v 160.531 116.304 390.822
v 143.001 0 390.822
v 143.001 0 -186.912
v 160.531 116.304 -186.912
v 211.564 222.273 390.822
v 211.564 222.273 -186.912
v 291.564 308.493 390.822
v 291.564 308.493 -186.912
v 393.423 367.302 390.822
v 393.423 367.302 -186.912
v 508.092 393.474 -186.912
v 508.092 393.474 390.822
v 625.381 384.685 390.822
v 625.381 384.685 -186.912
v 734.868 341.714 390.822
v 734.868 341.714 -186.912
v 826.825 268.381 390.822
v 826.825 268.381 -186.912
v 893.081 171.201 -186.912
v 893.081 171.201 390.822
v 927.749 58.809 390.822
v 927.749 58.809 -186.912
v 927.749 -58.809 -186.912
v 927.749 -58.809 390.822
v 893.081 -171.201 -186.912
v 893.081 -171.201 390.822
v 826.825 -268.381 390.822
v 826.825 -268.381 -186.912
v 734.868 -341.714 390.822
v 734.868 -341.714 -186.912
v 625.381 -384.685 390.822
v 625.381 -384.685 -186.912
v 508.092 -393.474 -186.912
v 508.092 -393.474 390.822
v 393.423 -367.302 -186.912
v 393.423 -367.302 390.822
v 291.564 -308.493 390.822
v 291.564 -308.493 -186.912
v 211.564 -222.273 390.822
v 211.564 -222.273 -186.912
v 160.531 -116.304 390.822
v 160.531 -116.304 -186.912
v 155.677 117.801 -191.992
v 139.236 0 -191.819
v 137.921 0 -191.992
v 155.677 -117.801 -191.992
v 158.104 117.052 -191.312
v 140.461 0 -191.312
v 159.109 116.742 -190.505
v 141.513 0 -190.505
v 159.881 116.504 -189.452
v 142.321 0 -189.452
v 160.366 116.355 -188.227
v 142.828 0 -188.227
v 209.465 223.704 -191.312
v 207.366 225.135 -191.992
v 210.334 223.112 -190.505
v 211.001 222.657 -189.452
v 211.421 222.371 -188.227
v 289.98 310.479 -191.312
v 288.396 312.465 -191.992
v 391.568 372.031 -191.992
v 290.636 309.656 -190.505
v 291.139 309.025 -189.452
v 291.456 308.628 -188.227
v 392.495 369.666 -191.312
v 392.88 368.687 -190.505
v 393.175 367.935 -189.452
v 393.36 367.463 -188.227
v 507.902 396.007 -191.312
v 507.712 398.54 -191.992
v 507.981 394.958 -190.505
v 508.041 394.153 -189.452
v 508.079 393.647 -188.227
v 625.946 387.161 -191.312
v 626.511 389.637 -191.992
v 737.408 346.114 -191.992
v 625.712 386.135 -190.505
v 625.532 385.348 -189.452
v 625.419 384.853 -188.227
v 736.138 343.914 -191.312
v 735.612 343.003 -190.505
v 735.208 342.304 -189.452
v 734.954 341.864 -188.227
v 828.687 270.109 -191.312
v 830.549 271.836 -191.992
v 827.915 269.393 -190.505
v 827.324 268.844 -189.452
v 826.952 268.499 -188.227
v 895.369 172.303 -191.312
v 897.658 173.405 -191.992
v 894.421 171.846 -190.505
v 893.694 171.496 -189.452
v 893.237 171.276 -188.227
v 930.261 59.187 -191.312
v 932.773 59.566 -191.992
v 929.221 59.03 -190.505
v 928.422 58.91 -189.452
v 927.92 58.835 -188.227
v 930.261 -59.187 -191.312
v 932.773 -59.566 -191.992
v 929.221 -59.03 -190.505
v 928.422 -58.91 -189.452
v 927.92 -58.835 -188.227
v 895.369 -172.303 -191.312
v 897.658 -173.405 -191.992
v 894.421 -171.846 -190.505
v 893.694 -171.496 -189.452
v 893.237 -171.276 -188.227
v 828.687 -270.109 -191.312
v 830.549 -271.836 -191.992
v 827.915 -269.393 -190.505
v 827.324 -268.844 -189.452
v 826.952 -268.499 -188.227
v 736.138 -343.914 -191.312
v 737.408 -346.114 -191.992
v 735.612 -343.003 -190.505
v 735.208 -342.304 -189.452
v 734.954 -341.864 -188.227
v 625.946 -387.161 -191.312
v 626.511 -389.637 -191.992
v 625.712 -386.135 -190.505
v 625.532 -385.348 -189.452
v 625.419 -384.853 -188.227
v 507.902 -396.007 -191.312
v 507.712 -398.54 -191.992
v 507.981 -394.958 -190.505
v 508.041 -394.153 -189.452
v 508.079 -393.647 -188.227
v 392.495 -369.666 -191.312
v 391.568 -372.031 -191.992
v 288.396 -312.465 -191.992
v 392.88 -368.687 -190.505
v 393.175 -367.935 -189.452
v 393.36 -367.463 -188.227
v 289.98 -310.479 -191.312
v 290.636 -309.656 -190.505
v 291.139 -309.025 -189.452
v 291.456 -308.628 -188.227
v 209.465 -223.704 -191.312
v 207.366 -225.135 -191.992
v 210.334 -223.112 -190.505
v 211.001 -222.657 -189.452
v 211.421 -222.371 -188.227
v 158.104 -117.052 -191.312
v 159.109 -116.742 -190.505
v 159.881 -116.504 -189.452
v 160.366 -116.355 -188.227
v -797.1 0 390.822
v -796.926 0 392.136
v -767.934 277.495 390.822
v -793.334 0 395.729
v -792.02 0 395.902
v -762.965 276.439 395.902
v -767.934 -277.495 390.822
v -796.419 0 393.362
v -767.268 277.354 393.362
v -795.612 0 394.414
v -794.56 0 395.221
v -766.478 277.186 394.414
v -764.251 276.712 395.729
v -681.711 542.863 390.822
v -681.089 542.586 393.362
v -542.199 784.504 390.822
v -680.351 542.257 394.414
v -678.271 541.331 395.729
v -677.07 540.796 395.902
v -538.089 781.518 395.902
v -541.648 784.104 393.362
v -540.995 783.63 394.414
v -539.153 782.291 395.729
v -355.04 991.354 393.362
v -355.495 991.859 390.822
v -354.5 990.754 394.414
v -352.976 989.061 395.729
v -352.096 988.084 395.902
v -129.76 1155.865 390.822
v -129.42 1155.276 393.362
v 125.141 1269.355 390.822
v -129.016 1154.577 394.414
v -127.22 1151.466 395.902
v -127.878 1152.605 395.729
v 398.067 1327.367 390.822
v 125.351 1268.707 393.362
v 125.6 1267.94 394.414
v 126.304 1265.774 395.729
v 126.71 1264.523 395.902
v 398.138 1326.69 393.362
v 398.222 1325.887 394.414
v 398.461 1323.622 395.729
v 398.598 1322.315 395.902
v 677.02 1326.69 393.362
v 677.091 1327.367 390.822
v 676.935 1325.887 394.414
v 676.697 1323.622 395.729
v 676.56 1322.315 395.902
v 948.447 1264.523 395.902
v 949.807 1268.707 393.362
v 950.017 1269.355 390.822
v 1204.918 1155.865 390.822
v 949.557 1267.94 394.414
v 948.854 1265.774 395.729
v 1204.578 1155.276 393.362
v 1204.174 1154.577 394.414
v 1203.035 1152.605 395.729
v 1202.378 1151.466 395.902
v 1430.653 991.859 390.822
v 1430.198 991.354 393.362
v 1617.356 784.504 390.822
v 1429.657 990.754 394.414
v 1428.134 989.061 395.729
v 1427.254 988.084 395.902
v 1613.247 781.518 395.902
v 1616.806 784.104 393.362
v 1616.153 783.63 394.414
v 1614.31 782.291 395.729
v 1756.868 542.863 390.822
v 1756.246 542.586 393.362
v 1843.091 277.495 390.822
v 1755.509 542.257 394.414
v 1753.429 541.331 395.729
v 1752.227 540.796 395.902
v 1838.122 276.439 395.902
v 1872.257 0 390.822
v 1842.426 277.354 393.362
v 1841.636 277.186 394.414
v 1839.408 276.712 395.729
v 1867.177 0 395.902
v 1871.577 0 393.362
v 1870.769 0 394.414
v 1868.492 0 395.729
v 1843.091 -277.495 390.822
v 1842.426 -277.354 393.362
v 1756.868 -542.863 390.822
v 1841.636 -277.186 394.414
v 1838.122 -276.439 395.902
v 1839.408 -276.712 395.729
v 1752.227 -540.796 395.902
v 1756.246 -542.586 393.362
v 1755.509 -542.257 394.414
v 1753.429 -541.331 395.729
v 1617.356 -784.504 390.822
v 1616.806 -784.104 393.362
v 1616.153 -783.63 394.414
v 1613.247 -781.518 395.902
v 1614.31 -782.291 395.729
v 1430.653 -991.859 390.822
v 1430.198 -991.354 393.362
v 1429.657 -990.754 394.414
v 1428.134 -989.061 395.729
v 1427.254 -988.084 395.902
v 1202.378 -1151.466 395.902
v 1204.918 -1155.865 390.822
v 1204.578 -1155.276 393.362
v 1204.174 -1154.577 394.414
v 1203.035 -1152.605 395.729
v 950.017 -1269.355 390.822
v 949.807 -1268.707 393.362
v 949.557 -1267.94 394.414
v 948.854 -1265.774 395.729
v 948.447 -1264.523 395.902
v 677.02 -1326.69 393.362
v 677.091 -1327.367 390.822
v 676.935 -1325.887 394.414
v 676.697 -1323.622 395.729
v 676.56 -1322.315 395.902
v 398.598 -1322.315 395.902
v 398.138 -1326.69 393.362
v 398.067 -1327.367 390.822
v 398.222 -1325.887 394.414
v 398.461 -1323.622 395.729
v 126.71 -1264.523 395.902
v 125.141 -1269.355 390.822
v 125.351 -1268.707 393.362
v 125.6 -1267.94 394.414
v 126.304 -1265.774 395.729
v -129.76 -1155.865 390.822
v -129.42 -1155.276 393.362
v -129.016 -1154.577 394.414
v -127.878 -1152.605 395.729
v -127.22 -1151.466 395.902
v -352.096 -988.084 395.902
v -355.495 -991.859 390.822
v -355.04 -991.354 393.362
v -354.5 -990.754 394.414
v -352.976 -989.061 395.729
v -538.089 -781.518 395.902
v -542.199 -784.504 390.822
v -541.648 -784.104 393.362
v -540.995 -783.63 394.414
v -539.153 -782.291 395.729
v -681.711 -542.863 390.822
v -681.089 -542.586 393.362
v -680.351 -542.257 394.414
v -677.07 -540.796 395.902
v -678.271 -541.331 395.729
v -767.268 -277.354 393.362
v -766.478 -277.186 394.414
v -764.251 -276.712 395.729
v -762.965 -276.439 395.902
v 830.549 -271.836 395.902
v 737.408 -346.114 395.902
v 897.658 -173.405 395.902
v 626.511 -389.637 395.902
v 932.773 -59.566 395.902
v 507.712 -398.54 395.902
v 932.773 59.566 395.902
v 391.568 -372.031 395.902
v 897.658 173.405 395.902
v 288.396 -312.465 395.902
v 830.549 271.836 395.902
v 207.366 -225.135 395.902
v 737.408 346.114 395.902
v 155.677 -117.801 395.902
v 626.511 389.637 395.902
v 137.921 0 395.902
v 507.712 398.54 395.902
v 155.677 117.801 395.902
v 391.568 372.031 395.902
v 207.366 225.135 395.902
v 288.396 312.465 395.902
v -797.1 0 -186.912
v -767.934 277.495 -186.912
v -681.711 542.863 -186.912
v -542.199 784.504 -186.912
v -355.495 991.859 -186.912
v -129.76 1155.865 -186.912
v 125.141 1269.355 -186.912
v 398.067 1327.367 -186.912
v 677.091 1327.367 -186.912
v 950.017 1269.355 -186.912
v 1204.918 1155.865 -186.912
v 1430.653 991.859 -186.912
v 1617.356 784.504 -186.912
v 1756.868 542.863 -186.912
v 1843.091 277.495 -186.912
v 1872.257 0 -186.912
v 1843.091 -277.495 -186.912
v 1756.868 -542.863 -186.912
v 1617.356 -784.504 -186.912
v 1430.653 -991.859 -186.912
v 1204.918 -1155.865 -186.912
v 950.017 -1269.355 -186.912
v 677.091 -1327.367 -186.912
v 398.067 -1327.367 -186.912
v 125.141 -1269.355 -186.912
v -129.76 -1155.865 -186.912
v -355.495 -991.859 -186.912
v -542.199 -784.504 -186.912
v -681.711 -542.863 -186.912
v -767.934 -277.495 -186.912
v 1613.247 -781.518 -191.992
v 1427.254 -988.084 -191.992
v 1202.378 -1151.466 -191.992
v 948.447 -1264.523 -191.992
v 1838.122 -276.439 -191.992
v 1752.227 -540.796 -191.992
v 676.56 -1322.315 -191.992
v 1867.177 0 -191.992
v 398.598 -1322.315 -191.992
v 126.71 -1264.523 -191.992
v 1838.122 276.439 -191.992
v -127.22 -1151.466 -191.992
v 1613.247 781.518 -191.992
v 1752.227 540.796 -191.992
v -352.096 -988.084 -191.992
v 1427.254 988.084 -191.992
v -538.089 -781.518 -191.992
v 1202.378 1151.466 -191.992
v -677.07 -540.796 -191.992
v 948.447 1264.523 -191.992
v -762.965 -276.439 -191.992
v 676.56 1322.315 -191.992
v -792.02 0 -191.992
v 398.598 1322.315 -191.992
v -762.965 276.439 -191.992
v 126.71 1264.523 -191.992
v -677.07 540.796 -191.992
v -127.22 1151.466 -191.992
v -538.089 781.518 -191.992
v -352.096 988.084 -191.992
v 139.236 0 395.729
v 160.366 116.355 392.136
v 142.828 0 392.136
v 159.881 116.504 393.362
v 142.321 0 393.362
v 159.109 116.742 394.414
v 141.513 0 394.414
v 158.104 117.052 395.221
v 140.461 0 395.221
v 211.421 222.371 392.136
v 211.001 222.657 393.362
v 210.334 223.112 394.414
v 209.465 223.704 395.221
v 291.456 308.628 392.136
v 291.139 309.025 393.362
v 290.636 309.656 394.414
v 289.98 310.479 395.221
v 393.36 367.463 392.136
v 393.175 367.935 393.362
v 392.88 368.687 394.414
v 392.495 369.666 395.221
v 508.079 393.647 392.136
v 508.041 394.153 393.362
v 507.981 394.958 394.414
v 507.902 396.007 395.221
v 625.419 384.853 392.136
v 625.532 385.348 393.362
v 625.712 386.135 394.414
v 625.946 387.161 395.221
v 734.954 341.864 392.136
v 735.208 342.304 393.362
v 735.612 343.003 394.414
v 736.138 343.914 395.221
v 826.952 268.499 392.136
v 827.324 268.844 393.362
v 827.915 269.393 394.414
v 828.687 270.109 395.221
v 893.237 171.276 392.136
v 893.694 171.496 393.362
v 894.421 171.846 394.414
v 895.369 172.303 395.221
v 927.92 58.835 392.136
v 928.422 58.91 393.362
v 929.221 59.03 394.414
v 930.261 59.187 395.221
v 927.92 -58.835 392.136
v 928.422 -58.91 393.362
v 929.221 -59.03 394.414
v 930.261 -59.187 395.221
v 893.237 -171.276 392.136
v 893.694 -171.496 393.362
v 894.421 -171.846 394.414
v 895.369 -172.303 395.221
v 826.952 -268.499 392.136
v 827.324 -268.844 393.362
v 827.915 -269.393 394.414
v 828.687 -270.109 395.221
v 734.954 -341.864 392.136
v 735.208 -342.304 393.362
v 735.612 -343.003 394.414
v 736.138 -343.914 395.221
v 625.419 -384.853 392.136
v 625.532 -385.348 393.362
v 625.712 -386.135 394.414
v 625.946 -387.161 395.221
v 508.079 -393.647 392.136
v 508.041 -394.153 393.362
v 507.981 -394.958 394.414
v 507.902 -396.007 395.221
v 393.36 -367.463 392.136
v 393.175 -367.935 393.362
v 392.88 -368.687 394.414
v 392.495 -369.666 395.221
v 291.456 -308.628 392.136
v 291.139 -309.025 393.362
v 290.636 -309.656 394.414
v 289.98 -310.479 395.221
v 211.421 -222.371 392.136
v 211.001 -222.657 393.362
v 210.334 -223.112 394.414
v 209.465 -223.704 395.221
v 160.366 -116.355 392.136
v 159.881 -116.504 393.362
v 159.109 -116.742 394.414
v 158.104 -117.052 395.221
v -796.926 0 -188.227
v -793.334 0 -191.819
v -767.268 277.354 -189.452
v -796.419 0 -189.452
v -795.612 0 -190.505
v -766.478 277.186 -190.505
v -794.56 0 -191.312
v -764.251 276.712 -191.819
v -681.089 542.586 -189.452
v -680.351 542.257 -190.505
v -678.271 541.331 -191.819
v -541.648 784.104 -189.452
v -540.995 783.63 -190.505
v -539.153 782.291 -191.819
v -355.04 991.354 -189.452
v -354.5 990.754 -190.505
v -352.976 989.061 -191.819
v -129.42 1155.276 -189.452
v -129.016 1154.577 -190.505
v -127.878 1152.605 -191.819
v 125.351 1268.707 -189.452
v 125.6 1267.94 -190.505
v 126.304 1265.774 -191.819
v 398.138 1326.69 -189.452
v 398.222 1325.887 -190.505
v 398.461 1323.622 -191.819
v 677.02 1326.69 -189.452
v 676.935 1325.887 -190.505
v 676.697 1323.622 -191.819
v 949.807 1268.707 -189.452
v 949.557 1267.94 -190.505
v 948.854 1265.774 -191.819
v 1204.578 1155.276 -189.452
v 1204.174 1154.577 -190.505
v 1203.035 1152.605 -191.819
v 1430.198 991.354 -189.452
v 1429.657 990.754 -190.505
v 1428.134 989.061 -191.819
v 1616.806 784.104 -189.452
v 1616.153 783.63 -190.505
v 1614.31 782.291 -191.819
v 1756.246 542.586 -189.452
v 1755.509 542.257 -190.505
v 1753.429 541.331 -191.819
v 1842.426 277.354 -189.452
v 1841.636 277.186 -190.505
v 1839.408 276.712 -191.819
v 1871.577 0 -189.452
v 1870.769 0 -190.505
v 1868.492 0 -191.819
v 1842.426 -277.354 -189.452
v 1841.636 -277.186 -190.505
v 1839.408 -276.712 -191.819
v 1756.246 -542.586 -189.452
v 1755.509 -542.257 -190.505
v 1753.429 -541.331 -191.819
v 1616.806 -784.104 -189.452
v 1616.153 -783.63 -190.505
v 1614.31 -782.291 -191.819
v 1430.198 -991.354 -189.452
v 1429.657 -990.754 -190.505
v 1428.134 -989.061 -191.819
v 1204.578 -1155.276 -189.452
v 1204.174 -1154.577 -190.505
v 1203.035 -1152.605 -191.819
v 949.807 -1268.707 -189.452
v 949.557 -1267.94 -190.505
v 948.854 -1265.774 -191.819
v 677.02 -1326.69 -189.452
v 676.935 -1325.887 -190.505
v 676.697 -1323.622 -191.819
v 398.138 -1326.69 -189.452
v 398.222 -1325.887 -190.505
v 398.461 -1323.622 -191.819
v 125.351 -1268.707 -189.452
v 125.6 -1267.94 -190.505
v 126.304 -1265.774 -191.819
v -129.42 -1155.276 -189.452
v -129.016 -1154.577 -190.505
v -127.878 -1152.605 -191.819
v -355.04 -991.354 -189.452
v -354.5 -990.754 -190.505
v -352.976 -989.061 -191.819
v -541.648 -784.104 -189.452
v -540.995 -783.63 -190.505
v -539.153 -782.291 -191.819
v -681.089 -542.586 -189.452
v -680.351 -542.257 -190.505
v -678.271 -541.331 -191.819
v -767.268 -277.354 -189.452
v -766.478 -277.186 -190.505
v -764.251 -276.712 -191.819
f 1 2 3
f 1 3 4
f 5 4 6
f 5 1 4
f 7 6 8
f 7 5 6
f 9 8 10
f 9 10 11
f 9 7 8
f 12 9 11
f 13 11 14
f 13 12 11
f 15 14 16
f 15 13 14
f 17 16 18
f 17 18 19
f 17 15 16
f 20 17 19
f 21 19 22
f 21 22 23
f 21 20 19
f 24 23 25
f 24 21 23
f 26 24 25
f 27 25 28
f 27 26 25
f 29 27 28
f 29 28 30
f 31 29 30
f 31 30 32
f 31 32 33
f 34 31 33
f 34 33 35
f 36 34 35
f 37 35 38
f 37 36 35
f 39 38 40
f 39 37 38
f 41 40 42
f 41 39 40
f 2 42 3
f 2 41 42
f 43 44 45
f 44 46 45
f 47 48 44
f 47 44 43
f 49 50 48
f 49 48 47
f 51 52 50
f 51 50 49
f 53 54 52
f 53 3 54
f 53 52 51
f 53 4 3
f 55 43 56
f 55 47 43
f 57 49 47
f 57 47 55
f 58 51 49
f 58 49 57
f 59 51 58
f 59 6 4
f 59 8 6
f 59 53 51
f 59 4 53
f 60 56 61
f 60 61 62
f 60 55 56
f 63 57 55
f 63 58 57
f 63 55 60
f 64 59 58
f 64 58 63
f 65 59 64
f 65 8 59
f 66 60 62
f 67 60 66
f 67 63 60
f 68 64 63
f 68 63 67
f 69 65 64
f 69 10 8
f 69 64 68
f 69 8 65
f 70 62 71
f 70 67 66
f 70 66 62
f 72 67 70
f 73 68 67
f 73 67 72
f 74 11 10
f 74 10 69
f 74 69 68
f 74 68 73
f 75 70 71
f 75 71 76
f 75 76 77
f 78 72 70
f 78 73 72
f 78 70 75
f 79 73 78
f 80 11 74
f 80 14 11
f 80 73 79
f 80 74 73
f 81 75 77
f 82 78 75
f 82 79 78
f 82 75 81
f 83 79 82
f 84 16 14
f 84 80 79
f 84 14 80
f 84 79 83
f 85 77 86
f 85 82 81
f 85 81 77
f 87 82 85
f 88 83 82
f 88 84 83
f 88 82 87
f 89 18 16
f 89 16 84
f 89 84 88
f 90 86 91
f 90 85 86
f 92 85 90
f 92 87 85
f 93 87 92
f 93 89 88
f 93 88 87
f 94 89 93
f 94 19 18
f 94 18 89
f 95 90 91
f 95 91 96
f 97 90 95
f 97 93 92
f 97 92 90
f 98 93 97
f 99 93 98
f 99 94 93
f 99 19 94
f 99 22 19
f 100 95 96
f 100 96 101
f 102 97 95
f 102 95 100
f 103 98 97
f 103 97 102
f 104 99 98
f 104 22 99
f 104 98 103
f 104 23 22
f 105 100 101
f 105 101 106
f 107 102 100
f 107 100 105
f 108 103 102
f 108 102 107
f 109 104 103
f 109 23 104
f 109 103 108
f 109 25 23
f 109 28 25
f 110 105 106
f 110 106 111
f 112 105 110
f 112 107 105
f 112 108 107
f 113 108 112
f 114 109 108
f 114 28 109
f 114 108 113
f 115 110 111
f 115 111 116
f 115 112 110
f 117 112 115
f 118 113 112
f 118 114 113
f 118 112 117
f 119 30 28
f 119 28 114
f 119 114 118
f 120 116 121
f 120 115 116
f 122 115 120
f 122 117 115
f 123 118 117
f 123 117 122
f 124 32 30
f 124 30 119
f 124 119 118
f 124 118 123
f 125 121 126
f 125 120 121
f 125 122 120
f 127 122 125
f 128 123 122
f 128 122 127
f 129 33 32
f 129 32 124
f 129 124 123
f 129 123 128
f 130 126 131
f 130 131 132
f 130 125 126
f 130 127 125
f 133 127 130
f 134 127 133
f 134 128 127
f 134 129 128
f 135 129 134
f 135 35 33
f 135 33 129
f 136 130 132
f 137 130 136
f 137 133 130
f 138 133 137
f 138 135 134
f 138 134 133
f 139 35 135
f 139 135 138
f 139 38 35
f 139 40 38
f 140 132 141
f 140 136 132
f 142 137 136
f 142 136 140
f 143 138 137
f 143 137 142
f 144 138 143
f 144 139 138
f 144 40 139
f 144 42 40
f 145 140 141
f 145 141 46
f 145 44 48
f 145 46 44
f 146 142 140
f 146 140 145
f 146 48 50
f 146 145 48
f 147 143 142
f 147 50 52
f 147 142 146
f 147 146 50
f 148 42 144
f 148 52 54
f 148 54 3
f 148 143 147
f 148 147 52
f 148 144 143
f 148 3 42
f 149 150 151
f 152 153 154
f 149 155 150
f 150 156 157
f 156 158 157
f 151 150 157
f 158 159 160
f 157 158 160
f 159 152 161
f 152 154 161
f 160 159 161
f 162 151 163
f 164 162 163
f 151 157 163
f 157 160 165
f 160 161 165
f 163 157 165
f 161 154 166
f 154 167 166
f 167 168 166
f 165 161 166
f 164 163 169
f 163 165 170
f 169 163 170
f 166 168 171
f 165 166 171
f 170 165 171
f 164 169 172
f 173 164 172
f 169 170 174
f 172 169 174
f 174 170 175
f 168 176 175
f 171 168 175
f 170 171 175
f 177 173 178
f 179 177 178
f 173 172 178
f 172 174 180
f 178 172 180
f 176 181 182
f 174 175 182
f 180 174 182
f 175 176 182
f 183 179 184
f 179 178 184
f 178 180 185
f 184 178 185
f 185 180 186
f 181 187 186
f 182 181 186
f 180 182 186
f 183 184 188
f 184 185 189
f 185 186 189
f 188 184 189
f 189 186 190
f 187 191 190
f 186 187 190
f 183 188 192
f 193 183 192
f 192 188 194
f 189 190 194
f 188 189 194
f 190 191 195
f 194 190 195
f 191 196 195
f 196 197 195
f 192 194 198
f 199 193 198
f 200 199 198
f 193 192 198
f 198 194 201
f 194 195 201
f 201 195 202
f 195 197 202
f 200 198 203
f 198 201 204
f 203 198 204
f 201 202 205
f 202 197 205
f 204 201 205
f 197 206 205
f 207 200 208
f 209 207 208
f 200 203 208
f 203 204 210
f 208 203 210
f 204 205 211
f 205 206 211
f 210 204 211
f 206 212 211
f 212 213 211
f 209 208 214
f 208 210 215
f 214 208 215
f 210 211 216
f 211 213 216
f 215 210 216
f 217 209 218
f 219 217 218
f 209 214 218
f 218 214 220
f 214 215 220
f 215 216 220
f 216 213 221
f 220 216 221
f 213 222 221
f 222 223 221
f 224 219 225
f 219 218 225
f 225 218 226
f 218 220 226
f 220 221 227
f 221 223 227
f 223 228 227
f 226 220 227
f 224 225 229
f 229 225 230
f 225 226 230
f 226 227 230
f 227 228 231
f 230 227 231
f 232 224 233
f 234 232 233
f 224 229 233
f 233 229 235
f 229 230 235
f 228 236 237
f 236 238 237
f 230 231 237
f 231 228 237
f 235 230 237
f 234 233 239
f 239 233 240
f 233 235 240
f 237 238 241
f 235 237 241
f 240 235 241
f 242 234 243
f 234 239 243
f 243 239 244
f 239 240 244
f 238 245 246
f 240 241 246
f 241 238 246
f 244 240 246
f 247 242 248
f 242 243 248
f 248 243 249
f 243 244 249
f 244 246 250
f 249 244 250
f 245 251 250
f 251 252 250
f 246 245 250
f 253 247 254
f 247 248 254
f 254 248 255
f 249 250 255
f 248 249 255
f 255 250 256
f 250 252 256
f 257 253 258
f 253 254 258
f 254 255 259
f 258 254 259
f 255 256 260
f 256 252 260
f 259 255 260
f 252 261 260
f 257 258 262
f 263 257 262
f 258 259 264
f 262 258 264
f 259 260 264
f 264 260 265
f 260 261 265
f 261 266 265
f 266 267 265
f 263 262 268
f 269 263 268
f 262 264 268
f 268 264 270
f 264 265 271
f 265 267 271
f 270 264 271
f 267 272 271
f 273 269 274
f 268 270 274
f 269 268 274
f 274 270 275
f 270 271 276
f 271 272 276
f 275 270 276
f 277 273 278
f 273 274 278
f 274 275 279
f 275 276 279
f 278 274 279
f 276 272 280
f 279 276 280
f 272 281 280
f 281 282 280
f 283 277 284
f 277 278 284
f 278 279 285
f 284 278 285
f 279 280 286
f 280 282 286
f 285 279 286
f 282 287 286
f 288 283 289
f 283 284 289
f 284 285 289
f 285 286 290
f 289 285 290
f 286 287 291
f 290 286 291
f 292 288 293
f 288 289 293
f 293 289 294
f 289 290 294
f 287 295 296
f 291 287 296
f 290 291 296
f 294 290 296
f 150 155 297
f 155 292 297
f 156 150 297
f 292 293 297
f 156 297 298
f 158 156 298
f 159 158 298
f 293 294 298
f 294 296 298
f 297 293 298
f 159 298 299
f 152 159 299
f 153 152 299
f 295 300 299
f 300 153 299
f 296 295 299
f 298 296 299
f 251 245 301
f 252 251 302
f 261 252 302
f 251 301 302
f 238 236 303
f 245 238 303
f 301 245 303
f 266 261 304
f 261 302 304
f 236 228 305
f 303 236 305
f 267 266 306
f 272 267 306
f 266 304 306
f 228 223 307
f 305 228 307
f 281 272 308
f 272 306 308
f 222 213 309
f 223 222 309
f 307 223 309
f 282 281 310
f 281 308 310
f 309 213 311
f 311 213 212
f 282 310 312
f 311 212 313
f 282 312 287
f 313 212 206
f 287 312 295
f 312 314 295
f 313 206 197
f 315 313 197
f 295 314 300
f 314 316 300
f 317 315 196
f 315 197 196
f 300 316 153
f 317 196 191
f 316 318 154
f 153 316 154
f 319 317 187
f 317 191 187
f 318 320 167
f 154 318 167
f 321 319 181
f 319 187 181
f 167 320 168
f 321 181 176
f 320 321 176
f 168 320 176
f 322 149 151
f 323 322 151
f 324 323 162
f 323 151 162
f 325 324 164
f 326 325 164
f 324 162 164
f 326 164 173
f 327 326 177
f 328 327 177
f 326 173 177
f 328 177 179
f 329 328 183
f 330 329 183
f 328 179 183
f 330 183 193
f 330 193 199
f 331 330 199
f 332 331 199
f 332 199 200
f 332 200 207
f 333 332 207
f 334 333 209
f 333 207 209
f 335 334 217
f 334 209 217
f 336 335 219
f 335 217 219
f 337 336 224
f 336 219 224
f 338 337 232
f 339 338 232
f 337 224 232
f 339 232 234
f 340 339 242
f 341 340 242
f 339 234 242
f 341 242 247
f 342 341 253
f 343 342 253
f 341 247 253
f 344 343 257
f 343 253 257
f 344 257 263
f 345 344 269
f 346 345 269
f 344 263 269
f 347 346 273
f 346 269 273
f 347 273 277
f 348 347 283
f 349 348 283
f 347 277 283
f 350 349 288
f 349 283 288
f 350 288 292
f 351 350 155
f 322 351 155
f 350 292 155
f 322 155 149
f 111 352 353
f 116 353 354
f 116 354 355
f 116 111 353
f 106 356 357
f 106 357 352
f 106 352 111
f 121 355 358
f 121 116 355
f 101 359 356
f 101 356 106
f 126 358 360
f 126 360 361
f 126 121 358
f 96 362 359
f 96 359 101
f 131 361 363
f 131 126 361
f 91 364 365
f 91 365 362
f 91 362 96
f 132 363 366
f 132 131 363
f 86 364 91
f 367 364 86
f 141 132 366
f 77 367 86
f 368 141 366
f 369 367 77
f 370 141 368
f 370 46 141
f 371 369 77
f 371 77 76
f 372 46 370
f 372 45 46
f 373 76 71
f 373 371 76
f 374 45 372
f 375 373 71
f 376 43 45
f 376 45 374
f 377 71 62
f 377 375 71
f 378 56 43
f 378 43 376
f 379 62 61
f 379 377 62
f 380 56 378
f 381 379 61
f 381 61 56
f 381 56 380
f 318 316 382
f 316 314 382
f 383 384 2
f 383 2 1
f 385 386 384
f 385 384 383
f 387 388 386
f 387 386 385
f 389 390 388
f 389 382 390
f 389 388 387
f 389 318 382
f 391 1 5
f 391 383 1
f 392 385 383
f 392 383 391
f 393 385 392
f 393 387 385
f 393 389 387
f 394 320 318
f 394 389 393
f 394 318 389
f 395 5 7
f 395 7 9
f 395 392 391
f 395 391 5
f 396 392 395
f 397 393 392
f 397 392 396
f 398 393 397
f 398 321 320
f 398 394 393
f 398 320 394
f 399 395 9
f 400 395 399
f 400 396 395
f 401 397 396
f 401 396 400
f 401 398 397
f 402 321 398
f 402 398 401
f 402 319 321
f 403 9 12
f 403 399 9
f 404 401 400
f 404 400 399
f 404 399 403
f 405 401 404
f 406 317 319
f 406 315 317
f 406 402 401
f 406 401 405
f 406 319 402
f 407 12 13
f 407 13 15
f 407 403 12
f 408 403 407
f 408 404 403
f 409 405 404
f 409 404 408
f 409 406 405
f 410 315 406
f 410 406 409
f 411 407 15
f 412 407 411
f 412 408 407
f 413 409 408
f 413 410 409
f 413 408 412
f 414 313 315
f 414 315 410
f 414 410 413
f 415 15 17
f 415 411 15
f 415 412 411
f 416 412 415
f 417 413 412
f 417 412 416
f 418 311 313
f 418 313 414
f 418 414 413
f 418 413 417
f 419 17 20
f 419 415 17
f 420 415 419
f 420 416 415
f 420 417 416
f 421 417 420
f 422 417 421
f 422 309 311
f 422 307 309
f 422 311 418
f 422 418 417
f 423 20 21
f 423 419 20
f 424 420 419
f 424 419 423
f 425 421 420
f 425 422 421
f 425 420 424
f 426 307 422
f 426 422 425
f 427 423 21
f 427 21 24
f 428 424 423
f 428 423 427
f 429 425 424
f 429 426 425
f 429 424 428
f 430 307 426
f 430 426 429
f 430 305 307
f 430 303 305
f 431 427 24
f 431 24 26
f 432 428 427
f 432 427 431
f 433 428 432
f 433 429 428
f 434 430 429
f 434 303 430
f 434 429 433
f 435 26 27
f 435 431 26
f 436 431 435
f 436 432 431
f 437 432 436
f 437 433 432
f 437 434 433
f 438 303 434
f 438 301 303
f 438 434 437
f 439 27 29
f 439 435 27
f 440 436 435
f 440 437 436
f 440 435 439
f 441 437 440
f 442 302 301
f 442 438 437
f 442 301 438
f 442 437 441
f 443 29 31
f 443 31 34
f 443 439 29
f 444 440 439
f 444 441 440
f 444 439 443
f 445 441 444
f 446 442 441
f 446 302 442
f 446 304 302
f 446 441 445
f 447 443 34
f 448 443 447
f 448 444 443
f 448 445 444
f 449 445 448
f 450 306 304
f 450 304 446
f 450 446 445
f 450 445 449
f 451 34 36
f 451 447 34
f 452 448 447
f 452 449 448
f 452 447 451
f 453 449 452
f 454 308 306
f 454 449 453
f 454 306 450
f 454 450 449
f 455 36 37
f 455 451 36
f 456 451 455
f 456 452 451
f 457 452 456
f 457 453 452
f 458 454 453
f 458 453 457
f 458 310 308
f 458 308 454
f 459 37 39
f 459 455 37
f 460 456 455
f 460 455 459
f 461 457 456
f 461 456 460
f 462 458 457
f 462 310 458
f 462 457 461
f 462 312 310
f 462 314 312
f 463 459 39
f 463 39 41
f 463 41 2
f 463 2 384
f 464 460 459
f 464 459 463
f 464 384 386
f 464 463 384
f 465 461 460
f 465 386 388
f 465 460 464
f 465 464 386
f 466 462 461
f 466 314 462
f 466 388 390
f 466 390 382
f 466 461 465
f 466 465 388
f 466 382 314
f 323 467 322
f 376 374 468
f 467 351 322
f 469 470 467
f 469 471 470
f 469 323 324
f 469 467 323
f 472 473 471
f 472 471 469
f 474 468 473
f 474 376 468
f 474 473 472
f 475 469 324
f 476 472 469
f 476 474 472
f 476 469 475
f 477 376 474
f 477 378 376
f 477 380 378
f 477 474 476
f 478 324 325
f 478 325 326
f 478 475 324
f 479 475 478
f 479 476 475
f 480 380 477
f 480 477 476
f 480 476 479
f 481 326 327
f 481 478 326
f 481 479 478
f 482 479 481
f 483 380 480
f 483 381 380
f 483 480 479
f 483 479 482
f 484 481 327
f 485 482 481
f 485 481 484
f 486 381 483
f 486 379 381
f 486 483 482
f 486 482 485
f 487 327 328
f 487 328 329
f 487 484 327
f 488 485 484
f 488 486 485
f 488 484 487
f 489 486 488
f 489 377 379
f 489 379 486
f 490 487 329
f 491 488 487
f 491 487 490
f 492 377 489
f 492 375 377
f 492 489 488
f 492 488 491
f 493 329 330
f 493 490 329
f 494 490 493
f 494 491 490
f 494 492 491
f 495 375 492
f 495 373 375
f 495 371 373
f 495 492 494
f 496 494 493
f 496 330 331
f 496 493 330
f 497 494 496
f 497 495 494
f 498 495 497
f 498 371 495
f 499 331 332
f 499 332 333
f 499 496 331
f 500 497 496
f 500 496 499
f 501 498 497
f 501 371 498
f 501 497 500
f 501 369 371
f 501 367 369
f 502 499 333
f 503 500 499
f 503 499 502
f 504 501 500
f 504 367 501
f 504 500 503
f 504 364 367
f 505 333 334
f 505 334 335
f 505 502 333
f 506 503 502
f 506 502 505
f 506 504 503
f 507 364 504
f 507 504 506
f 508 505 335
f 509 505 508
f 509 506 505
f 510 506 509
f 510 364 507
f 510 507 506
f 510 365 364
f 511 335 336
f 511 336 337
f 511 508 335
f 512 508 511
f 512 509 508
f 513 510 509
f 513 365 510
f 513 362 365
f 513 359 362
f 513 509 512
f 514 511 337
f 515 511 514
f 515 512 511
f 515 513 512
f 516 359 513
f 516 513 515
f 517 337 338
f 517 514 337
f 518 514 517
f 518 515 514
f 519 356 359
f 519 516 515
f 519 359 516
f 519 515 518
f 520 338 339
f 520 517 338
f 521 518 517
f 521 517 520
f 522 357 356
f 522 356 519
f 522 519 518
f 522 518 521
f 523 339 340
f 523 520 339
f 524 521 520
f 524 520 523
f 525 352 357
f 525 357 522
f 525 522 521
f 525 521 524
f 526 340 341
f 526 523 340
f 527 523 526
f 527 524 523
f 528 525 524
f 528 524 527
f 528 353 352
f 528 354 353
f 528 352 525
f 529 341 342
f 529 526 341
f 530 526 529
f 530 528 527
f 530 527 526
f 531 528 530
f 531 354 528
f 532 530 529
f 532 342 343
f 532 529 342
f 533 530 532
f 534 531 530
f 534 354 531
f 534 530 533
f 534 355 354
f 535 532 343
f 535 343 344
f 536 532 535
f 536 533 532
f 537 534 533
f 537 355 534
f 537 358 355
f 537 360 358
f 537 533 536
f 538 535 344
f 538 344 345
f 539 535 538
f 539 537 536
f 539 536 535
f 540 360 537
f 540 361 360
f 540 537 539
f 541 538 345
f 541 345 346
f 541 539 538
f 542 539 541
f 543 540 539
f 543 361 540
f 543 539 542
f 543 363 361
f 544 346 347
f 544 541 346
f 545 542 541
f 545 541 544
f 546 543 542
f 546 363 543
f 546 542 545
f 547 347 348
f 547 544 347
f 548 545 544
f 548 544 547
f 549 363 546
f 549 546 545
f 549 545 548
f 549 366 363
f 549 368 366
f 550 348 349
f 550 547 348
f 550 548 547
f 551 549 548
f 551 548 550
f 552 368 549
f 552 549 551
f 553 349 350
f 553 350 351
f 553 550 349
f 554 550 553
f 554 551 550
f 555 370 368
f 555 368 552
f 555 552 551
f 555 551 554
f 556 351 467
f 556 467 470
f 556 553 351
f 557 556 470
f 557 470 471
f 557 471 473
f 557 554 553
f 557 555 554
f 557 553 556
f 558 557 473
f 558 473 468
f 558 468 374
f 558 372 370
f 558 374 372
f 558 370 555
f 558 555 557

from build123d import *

# Parameters (mm, degrees)
F0_W = 940.1008635759
F0_H = 587.8940969706
F2_R = 5.08


with BuildPart() as f1:
    # F0 (on Front) → F1 (revolve)
    with BuildSketch(Plane.XZ):
        with Locations((-327.0491585135, 101.9546017051)):
            Rectangle(F0_W, F0_H)
    revolve(axis=Axis((537.5788211823, 0, 63.5561272502), (0, 0, -1)))

    # F2
    f2_edges = [f1.edges().sort_by_distance(p)[0] for p in [
        (1872.257233, 0, -191.992447),
        (932.156369, 0, -191.992447),
        (1872.257233, 0, 395.90165),
        (-797.09959, 0, 101.954602),
        (932.156369, 0, 395.90165),
    ]]
    fillet(f2_edges, radius=F2_R)


solid = f1.part
